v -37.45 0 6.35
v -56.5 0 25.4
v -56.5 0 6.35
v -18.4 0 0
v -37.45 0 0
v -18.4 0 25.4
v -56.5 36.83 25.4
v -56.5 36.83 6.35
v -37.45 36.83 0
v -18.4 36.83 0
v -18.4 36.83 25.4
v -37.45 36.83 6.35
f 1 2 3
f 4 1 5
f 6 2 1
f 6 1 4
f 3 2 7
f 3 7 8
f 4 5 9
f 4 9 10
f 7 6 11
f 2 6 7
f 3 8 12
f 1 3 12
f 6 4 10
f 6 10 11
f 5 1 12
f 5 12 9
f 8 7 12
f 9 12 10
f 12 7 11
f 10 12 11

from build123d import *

# Parameters (mm, degrees)
F0_W     = 19.05
F0_H     = 6.35
F1_DEPTH = 36.83


with BuildPart() as f1:
    # F0 (on Front) → F1 (new body)
    with BuildSketch(Plane.XZ):
        Polygon((-37.449954, 6.35), (-37.449954, 19.05), (-37.449954, 25.4), (-56.499954, 25.4), (-56.499954, 6.35), align=None)
        with Locations((-27.924954, 22.225)):
            Rectangle(F0_W, F0_H)
        Polygon((-37.449954, 0), (-18.399954, 0), (-18.399954, 19.05), (-37.449954, 19.05), (-37.449954, 6.35), align=None)
    extrude(amount=-F1_DEPTH)


solid = f1.part
